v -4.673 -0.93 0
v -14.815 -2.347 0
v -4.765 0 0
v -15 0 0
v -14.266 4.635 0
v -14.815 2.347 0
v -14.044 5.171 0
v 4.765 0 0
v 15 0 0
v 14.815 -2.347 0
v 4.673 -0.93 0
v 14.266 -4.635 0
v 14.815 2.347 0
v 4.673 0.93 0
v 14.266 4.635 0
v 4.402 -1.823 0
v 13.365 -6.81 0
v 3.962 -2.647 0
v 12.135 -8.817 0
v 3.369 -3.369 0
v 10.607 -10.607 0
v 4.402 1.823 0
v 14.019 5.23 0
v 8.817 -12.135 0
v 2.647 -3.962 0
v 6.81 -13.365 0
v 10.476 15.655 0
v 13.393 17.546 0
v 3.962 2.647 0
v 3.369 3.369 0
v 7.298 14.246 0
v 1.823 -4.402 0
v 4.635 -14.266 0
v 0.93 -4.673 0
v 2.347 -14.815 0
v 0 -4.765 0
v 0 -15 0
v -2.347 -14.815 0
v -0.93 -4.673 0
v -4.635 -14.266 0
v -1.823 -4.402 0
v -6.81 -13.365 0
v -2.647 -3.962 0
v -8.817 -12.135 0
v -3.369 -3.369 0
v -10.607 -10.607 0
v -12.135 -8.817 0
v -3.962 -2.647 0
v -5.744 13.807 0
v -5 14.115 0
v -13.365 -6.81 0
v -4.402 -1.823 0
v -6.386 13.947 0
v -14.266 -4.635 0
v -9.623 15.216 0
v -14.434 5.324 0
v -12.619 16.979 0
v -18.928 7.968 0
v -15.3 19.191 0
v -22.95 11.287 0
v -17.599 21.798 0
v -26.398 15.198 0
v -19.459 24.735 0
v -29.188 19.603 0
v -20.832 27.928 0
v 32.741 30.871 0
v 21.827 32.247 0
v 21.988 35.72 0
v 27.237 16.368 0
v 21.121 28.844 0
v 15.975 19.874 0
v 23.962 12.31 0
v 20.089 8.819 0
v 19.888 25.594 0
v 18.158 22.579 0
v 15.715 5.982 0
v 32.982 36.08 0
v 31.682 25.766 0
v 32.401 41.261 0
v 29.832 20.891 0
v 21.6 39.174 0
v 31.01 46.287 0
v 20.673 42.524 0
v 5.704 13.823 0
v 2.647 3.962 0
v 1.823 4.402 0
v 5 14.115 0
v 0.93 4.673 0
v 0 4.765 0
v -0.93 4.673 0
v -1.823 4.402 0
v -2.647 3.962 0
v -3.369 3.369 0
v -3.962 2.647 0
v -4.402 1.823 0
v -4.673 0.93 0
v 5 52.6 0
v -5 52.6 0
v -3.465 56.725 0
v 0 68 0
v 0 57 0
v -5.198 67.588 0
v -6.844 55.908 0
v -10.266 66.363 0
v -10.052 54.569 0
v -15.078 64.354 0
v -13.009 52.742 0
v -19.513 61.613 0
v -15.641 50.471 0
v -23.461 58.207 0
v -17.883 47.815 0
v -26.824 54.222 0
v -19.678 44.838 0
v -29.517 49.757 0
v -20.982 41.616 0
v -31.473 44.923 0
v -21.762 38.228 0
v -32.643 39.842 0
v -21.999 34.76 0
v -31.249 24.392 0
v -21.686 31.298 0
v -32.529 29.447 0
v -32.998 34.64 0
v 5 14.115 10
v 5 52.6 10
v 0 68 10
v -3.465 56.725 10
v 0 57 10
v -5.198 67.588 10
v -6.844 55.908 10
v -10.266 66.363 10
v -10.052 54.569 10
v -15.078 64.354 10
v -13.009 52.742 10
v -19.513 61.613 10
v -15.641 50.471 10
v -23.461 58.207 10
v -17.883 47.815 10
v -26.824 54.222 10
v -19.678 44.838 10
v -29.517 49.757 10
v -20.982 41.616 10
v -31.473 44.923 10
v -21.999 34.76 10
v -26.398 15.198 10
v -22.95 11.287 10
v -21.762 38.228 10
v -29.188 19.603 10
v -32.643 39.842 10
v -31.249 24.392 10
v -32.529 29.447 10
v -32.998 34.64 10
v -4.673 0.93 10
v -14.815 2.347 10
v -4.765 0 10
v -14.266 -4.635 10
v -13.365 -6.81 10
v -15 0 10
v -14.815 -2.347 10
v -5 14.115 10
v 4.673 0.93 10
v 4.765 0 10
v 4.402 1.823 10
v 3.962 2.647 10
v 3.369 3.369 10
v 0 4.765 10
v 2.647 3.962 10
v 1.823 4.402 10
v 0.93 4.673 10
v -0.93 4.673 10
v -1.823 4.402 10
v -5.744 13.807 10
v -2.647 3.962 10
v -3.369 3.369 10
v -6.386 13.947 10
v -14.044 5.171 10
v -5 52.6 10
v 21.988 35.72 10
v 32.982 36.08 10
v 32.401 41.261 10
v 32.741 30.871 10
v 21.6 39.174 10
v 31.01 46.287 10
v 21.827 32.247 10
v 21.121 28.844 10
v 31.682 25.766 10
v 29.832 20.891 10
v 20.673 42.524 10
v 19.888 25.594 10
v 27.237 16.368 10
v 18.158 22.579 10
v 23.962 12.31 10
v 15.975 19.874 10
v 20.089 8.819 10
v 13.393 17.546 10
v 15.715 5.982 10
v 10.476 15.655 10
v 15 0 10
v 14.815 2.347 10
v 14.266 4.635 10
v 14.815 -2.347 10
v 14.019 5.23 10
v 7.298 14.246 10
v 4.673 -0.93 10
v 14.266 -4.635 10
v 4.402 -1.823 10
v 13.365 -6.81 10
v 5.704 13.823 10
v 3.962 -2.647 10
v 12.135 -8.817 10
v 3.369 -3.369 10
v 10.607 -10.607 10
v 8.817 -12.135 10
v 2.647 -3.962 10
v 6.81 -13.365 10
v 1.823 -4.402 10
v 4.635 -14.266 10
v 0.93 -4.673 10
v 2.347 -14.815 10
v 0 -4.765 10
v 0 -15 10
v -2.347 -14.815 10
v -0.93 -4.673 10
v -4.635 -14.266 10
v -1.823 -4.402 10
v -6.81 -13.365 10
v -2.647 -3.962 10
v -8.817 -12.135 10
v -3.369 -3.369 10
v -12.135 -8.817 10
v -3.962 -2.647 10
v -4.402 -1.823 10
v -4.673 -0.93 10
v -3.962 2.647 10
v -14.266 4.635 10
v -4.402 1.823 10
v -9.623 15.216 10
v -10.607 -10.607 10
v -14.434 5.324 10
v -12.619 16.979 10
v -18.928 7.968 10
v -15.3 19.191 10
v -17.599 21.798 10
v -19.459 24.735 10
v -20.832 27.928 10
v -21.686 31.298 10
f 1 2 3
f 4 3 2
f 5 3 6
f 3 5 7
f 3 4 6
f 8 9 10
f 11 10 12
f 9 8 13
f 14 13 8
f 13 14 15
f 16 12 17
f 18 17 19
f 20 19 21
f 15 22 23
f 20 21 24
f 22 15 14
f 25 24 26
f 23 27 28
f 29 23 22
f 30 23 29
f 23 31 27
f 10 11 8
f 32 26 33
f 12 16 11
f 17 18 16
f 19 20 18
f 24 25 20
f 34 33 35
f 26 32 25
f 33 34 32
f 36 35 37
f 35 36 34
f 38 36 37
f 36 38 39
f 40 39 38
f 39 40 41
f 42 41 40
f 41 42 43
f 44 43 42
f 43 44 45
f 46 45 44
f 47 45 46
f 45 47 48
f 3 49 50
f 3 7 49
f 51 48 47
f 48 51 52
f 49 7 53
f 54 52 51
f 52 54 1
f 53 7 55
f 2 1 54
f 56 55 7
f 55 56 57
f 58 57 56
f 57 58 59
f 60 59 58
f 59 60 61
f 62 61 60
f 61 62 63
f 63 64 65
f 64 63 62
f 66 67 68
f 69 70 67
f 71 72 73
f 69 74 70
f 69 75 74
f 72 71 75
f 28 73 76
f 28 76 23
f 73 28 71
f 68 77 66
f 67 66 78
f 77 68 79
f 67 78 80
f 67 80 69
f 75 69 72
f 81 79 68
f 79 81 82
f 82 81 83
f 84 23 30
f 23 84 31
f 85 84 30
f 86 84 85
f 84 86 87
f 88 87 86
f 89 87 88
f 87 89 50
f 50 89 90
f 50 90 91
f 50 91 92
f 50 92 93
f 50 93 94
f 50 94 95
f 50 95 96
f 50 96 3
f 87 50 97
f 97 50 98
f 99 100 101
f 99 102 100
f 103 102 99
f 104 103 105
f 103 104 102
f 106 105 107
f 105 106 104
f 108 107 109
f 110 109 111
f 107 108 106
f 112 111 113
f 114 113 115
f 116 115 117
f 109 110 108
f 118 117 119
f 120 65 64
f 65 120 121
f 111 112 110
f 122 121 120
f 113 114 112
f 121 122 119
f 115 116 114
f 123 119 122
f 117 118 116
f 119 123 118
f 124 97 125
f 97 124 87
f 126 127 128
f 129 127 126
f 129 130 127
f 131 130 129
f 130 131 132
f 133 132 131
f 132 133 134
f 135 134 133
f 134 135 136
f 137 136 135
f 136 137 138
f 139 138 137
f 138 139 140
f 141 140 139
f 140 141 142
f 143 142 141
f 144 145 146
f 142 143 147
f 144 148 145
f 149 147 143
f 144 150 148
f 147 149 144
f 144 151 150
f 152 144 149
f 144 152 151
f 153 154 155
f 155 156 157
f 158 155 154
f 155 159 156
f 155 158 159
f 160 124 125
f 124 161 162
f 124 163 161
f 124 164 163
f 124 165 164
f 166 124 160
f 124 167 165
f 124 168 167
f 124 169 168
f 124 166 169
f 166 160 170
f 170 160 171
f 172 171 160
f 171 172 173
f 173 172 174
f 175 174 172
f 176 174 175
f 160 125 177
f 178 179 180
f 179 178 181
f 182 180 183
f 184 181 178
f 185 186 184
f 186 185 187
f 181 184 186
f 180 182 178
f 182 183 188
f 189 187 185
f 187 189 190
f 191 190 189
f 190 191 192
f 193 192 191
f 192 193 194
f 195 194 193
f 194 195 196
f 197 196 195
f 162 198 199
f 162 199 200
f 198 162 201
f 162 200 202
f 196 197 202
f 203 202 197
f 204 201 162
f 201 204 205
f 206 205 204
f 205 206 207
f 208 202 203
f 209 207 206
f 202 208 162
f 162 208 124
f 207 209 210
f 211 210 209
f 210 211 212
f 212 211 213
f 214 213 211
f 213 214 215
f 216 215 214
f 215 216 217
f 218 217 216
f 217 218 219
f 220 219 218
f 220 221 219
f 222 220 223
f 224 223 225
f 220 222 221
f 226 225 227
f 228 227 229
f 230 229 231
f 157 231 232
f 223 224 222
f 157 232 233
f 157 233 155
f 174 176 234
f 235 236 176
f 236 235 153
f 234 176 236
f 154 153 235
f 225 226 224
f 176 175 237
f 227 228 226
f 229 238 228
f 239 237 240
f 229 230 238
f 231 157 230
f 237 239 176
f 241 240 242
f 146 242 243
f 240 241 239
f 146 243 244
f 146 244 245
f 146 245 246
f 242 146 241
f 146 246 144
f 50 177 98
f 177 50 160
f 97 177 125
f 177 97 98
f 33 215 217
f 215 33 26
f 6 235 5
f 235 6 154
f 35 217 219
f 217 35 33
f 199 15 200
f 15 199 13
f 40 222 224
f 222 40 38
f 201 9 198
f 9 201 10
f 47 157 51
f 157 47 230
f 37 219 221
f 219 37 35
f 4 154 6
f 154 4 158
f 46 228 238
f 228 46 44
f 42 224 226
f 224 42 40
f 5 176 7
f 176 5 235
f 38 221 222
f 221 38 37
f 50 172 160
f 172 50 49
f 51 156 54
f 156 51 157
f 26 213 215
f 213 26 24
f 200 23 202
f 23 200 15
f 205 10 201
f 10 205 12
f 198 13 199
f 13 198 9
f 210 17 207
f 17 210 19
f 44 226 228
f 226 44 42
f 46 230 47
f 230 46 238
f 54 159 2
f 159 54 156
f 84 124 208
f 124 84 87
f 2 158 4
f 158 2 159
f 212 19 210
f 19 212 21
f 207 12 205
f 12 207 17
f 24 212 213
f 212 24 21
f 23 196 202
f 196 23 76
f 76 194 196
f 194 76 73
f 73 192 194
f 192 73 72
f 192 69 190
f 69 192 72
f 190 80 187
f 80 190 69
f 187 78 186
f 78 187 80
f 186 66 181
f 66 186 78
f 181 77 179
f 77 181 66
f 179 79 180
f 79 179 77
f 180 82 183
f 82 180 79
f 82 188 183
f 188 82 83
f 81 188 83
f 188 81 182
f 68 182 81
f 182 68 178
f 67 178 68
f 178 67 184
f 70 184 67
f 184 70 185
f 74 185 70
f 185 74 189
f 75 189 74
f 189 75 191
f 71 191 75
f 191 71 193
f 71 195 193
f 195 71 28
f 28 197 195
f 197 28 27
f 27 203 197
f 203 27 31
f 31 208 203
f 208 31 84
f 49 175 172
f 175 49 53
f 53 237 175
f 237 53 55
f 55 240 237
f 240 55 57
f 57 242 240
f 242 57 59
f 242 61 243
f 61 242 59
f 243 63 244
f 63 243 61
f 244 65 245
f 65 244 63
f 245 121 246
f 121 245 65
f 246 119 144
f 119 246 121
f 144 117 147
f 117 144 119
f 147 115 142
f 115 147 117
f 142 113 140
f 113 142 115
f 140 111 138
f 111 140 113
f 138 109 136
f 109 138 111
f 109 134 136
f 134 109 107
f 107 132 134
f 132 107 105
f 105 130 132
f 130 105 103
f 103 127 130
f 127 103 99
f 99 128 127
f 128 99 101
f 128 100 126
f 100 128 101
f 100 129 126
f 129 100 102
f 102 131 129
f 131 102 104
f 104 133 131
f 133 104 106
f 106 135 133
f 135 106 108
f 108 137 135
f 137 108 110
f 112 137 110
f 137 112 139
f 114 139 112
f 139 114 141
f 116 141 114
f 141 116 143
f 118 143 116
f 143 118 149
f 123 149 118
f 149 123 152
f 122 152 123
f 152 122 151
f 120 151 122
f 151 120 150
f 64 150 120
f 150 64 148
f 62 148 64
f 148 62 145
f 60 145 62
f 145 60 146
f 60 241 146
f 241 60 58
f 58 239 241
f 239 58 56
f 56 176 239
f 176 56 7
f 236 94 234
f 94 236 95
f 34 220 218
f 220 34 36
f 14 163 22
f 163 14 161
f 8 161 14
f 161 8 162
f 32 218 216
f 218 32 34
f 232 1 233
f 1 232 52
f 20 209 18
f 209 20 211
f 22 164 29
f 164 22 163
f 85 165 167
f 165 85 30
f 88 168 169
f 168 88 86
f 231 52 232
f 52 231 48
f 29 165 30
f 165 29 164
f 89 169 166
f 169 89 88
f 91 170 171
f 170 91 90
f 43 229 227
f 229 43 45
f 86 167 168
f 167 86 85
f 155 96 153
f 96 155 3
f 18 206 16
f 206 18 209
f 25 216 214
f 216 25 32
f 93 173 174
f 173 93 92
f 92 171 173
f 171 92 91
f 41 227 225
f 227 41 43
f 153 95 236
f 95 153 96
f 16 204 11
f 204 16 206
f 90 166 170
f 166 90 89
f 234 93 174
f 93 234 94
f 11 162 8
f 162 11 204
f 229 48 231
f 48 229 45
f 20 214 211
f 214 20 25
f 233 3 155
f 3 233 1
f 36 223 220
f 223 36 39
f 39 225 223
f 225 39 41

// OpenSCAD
$fn = 32;

// ----------------------------------------------------------------------
// Hook: 70 mm shank into a 22 mm curl, 10 mm thick
// ----------------------------------------------------------------------

// --- parameters (mm) ---
shank_len = 70;           // shank length from the boss centre
shank_w = 10;             // shank width
boss_d = 30;              // boss diameter
bore_d = 9.53;            // boss bore
curl_in = 22;             // curl inner radius
curl_out = 33;            // curl outer radius
curl_sweep = 290;         // curl sweep angle
hook_t = 10;              // hook thickness

shank_profile = [[-5, 52.6], [5, 52.6], [5, 13], [-5, 13]];
boss_profile = [[15, 0], [14.815, 2.347], [14.266, 4.635], [13.365, 6.81], [12.135, 8.817], [10.607, 10.607], [8.817, 12.135], [6.81, 13.365], [4.635, 14.266], [2.347, 14.815], [0, 15], [-2.347, 14.815], [-4.635, 14.266], [-6.81, 13.365], [-8.817, 12.135], [-10.607, 10.607], [-12.135, 8.817], [-13.365, 6.81], [-14.266, 4.635], [-14.815, 2.347], [-15, 0], [-14.815, -2.347], [-14.266, -4.635], [-13.365, -6.81], [-12.135, -8.817], [-10.607, -10.607], [-8.817, -12.135], [-6.81, -13.365], [-4.635, -14.266], [-2.347, -14.815], [0, -15], [2.347, -14.815], [4.635, -14.266], [6.81, -13.365], [8.817, -12.135], [10.607, -10.607], [12.135, -8.817], [13.365, -6.81], [14.266, -4.635], [14.815, -2.347]];
curl_profile = [[0, 68], [-5.198, 67.588], [-10.266, 66.363], [-15.078, 64.354], [-19.513, 61.613], [-23.461, 58.207], [-26.824, 54.222], [-29.517, 49.757], [-31.473, 44.923], [-32.643, 39.842], [-32.998, 34.64], [-32.529, 29.447], [-31.249, 24.392], [-29.188, 19.603], [-26.398, 15.198], [-22.95, 11.287], [-18.928, 7.968], [-14.434, 5.324], [-9.579, 3.421], [-4.486, 2.306], [0.72, 2.008], [5.908, 2.533], [10.948, 3.869], [15.715, 5.982], [20.089, 8.819], [23.962, 12.31], [27.237, 16.368], [29.832, 20.891], [31.682, 25.766], [32.741, 30.871], [32.982, 36.08], [32.401, 41.261], [31.01, 46.287], [20.673, 42.524], [21.6, 39.174], [21.988, 35.72], [21.827, 32.247], [21.121, 28.844], [19.888, 25.594], [18.158, 22.579], [15.975, 19.874], [13.393, 17.546], [10.476, 15.655], [7.298, 14.246], [3.938, 13.355], [0.48, 13.005], [-2.99, 13.204], [-6.386, 13.947], [-9.623, 15.216], [-12.619, 16.979], [-15.3, 19.191], [-17.599, 21.798], [-19.459, 24.735], [-20.832, 27.928], [-21.686, 31.298], [-21.999, 34.76], [-21.762, 38.228], [-20.982, 41.616], [-19.678, 44.838], [-17.883, 47.815], [-15.641, 50.471], [-13.009, 52.742], [-10.052, 54.569], [-6.844, 55.908], [-3.465, 56.725], [0, 57]];

difference() {
  union() {
    /* three overlapping outlines: shank, boss and the smooth curl */
    linear_extrude(height = hook_t) polygon(shank_profile);
    linear_extrude(height = hook_t) polygon(boss_profile);
    linear_extrude(height = hook_t) polygon(curl_profile);
  }
  translate([0, 0, -2.5]) cylinder(h = hook_t + 5, d = bore_d);
}
